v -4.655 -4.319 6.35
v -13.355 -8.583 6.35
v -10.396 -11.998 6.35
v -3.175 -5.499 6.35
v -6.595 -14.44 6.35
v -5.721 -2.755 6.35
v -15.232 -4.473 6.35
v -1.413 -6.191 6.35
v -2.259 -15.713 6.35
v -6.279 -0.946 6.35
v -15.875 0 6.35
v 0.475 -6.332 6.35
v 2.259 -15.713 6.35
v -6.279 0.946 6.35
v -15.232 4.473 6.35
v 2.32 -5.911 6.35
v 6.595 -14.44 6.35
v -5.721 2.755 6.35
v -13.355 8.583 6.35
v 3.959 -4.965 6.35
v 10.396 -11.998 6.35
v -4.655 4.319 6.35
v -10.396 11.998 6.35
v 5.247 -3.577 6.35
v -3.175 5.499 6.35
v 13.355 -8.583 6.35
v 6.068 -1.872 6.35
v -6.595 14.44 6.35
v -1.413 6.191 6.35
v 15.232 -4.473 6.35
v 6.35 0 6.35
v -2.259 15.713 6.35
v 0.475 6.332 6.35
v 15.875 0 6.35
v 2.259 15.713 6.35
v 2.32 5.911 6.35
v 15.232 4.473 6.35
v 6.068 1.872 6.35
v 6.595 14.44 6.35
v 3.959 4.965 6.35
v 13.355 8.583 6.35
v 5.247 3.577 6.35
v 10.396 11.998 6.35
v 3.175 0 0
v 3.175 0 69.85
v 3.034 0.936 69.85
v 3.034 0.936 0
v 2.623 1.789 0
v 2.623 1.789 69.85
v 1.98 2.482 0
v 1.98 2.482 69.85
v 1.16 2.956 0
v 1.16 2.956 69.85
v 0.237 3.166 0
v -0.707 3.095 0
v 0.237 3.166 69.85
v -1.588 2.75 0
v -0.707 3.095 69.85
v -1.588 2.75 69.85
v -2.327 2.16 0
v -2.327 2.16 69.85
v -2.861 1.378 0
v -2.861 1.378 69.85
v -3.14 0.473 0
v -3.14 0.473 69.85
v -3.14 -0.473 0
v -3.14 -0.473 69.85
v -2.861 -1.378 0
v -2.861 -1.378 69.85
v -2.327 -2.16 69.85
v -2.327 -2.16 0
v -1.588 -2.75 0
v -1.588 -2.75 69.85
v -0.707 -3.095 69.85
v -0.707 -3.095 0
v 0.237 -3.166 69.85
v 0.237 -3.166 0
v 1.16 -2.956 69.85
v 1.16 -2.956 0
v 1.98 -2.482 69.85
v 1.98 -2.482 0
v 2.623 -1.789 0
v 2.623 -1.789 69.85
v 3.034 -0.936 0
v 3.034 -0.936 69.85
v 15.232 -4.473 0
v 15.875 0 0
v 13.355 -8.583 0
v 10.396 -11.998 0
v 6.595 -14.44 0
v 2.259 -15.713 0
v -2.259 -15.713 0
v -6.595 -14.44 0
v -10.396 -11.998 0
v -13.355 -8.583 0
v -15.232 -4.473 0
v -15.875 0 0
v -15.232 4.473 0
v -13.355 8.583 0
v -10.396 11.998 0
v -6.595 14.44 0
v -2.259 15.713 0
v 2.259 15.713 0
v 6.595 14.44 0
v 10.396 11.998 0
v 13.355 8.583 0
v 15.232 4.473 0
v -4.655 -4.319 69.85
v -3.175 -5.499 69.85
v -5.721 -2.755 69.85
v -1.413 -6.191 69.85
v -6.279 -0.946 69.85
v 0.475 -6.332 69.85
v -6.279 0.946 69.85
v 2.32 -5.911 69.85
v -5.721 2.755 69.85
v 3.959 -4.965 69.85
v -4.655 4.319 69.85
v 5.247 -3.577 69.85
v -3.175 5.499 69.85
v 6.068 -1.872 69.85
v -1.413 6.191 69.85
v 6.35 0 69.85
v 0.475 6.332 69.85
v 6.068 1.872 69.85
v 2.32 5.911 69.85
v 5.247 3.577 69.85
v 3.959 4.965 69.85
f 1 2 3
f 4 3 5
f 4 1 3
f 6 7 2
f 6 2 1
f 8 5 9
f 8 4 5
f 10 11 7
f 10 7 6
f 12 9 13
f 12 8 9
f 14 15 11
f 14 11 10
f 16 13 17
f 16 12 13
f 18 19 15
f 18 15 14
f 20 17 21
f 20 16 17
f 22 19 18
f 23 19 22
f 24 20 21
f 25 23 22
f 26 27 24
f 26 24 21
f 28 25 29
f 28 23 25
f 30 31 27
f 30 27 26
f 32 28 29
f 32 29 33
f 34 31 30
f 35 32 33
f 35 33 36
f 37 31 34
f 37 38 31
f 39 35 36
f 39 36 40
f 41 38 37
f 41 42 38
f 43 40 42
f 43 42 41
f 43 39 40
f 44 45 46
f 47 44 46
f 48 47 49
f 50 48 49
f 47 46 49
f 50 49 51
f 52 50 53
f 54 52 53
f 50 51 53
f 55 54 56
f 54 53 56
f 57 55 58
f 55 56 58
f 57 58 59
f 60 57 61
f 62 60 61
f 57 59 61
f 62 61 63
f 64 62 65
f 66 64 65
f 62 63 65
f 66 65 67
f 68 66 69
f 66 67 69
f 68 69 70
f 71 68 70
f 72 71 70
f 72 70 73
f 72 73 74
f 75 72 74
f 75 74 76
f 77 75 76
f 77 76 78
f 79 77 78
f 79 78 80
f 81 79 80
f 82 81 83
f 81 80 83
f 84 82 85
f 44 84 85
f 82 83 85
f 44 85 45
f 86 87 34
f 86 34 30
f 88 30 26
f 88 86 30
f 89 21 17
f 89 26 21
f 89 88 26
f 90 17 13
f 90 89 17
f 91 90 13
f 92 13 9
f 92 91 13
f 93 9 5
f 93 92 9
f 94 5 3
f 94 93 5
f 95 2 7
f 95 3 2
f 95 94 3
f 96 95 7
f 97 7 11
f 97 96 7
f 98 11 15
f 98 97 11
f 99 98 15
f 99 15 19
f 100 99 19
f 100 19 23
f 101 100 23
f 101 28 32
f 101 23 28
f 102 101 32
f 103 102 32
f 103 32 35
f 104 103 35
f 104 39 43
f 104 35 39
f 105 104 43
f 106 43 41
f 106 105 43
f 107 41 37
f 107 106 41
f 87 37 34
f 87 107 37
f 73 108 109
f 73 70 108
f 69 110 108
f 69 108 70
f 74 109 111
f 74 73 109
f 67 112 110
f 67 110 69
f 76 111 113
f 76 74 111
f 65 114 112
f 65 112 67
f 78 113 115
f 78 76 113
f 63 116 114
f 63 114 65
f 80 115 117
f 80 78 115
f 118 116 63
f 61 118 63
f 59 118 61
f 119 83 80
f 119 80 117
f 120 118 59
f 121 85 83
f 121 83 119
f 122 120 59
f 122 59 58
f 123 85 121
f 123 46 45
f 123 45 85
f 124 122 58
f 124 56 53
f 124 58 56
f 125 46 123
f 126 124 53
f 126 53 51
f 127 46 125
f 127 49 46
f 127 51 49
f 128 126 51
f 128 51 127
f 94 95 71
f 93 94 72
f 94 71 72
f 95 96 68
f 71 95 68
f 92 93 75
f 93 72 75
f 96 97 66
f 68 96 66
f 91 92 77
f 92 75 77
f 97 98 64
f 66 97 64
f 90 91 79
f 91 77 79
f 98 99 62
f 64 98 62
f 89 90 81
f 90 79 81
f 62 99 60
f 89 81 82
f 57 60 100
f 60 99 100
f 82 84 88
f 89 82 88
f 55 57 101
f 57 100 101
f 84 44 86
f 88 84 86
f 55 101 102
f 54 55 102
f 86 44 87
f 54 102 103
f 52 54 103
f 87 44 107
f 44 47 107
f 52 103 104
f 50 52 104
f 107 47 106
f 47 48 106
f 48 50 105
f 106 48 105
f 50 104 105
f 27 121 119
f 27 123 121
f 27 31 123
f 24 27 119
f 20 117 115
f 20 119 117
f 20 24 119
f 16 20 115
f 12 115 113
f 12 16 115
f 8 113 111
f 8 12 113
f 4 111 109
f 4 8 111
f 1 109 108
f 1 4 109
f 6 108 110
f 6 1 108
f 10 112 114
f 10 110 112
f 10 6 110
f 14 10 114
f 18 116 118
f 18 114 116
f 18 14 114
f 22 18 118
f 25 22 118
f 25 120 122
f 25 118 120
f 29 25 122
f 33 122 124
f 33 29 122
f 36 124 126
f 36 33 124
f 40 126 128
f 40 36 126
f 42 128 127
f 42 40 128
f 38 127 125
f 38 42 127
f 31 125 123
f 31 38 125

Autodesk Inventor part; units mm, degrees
ref_plane "YZ Plane" through (0, 0, 0) normal (1, 0, 0) x (0, 1, 0)
ref_plane "XZ Plane" through (0, 0, 0) normal (0, 1, 0) x (-1, 0, 0)
ref_plane "XY Plane" through (0, 0, 0) normal (0, 0, 1) x (1, 0, 0)
sketch "Sketch11" plane through (0, 0, 0) normal (0, 0, 1) x (1, 0, 0)
  circle A0 centre (0, 0) radius 15.875
  dimension "d21" = 31.75
extrude "Extrusion1" add sketch "Sketch11" along normal blind 6.35
sketch "Sketch12" plane through (0, 0, 6.35) normal (0, 0, 1) x (1, 0, 0)
  circle A0 centre (0, 0) radius 6.35
  dimension "d26" = 12.7
extrude "Extrusion2" add sketch "Sketch12" along normal blind 63.5
sketch "Sketch13" plane through (0, 0, 69.85) normal (0, 0, 1) x (1, 0, 0)
  circle A0 centre (0, 0) radius 3.175
  dimension "d27" = 6.35
extrude "Extrusion3" cut sketch "Sketch13" against normal through all
properties part number "punch_holder"
